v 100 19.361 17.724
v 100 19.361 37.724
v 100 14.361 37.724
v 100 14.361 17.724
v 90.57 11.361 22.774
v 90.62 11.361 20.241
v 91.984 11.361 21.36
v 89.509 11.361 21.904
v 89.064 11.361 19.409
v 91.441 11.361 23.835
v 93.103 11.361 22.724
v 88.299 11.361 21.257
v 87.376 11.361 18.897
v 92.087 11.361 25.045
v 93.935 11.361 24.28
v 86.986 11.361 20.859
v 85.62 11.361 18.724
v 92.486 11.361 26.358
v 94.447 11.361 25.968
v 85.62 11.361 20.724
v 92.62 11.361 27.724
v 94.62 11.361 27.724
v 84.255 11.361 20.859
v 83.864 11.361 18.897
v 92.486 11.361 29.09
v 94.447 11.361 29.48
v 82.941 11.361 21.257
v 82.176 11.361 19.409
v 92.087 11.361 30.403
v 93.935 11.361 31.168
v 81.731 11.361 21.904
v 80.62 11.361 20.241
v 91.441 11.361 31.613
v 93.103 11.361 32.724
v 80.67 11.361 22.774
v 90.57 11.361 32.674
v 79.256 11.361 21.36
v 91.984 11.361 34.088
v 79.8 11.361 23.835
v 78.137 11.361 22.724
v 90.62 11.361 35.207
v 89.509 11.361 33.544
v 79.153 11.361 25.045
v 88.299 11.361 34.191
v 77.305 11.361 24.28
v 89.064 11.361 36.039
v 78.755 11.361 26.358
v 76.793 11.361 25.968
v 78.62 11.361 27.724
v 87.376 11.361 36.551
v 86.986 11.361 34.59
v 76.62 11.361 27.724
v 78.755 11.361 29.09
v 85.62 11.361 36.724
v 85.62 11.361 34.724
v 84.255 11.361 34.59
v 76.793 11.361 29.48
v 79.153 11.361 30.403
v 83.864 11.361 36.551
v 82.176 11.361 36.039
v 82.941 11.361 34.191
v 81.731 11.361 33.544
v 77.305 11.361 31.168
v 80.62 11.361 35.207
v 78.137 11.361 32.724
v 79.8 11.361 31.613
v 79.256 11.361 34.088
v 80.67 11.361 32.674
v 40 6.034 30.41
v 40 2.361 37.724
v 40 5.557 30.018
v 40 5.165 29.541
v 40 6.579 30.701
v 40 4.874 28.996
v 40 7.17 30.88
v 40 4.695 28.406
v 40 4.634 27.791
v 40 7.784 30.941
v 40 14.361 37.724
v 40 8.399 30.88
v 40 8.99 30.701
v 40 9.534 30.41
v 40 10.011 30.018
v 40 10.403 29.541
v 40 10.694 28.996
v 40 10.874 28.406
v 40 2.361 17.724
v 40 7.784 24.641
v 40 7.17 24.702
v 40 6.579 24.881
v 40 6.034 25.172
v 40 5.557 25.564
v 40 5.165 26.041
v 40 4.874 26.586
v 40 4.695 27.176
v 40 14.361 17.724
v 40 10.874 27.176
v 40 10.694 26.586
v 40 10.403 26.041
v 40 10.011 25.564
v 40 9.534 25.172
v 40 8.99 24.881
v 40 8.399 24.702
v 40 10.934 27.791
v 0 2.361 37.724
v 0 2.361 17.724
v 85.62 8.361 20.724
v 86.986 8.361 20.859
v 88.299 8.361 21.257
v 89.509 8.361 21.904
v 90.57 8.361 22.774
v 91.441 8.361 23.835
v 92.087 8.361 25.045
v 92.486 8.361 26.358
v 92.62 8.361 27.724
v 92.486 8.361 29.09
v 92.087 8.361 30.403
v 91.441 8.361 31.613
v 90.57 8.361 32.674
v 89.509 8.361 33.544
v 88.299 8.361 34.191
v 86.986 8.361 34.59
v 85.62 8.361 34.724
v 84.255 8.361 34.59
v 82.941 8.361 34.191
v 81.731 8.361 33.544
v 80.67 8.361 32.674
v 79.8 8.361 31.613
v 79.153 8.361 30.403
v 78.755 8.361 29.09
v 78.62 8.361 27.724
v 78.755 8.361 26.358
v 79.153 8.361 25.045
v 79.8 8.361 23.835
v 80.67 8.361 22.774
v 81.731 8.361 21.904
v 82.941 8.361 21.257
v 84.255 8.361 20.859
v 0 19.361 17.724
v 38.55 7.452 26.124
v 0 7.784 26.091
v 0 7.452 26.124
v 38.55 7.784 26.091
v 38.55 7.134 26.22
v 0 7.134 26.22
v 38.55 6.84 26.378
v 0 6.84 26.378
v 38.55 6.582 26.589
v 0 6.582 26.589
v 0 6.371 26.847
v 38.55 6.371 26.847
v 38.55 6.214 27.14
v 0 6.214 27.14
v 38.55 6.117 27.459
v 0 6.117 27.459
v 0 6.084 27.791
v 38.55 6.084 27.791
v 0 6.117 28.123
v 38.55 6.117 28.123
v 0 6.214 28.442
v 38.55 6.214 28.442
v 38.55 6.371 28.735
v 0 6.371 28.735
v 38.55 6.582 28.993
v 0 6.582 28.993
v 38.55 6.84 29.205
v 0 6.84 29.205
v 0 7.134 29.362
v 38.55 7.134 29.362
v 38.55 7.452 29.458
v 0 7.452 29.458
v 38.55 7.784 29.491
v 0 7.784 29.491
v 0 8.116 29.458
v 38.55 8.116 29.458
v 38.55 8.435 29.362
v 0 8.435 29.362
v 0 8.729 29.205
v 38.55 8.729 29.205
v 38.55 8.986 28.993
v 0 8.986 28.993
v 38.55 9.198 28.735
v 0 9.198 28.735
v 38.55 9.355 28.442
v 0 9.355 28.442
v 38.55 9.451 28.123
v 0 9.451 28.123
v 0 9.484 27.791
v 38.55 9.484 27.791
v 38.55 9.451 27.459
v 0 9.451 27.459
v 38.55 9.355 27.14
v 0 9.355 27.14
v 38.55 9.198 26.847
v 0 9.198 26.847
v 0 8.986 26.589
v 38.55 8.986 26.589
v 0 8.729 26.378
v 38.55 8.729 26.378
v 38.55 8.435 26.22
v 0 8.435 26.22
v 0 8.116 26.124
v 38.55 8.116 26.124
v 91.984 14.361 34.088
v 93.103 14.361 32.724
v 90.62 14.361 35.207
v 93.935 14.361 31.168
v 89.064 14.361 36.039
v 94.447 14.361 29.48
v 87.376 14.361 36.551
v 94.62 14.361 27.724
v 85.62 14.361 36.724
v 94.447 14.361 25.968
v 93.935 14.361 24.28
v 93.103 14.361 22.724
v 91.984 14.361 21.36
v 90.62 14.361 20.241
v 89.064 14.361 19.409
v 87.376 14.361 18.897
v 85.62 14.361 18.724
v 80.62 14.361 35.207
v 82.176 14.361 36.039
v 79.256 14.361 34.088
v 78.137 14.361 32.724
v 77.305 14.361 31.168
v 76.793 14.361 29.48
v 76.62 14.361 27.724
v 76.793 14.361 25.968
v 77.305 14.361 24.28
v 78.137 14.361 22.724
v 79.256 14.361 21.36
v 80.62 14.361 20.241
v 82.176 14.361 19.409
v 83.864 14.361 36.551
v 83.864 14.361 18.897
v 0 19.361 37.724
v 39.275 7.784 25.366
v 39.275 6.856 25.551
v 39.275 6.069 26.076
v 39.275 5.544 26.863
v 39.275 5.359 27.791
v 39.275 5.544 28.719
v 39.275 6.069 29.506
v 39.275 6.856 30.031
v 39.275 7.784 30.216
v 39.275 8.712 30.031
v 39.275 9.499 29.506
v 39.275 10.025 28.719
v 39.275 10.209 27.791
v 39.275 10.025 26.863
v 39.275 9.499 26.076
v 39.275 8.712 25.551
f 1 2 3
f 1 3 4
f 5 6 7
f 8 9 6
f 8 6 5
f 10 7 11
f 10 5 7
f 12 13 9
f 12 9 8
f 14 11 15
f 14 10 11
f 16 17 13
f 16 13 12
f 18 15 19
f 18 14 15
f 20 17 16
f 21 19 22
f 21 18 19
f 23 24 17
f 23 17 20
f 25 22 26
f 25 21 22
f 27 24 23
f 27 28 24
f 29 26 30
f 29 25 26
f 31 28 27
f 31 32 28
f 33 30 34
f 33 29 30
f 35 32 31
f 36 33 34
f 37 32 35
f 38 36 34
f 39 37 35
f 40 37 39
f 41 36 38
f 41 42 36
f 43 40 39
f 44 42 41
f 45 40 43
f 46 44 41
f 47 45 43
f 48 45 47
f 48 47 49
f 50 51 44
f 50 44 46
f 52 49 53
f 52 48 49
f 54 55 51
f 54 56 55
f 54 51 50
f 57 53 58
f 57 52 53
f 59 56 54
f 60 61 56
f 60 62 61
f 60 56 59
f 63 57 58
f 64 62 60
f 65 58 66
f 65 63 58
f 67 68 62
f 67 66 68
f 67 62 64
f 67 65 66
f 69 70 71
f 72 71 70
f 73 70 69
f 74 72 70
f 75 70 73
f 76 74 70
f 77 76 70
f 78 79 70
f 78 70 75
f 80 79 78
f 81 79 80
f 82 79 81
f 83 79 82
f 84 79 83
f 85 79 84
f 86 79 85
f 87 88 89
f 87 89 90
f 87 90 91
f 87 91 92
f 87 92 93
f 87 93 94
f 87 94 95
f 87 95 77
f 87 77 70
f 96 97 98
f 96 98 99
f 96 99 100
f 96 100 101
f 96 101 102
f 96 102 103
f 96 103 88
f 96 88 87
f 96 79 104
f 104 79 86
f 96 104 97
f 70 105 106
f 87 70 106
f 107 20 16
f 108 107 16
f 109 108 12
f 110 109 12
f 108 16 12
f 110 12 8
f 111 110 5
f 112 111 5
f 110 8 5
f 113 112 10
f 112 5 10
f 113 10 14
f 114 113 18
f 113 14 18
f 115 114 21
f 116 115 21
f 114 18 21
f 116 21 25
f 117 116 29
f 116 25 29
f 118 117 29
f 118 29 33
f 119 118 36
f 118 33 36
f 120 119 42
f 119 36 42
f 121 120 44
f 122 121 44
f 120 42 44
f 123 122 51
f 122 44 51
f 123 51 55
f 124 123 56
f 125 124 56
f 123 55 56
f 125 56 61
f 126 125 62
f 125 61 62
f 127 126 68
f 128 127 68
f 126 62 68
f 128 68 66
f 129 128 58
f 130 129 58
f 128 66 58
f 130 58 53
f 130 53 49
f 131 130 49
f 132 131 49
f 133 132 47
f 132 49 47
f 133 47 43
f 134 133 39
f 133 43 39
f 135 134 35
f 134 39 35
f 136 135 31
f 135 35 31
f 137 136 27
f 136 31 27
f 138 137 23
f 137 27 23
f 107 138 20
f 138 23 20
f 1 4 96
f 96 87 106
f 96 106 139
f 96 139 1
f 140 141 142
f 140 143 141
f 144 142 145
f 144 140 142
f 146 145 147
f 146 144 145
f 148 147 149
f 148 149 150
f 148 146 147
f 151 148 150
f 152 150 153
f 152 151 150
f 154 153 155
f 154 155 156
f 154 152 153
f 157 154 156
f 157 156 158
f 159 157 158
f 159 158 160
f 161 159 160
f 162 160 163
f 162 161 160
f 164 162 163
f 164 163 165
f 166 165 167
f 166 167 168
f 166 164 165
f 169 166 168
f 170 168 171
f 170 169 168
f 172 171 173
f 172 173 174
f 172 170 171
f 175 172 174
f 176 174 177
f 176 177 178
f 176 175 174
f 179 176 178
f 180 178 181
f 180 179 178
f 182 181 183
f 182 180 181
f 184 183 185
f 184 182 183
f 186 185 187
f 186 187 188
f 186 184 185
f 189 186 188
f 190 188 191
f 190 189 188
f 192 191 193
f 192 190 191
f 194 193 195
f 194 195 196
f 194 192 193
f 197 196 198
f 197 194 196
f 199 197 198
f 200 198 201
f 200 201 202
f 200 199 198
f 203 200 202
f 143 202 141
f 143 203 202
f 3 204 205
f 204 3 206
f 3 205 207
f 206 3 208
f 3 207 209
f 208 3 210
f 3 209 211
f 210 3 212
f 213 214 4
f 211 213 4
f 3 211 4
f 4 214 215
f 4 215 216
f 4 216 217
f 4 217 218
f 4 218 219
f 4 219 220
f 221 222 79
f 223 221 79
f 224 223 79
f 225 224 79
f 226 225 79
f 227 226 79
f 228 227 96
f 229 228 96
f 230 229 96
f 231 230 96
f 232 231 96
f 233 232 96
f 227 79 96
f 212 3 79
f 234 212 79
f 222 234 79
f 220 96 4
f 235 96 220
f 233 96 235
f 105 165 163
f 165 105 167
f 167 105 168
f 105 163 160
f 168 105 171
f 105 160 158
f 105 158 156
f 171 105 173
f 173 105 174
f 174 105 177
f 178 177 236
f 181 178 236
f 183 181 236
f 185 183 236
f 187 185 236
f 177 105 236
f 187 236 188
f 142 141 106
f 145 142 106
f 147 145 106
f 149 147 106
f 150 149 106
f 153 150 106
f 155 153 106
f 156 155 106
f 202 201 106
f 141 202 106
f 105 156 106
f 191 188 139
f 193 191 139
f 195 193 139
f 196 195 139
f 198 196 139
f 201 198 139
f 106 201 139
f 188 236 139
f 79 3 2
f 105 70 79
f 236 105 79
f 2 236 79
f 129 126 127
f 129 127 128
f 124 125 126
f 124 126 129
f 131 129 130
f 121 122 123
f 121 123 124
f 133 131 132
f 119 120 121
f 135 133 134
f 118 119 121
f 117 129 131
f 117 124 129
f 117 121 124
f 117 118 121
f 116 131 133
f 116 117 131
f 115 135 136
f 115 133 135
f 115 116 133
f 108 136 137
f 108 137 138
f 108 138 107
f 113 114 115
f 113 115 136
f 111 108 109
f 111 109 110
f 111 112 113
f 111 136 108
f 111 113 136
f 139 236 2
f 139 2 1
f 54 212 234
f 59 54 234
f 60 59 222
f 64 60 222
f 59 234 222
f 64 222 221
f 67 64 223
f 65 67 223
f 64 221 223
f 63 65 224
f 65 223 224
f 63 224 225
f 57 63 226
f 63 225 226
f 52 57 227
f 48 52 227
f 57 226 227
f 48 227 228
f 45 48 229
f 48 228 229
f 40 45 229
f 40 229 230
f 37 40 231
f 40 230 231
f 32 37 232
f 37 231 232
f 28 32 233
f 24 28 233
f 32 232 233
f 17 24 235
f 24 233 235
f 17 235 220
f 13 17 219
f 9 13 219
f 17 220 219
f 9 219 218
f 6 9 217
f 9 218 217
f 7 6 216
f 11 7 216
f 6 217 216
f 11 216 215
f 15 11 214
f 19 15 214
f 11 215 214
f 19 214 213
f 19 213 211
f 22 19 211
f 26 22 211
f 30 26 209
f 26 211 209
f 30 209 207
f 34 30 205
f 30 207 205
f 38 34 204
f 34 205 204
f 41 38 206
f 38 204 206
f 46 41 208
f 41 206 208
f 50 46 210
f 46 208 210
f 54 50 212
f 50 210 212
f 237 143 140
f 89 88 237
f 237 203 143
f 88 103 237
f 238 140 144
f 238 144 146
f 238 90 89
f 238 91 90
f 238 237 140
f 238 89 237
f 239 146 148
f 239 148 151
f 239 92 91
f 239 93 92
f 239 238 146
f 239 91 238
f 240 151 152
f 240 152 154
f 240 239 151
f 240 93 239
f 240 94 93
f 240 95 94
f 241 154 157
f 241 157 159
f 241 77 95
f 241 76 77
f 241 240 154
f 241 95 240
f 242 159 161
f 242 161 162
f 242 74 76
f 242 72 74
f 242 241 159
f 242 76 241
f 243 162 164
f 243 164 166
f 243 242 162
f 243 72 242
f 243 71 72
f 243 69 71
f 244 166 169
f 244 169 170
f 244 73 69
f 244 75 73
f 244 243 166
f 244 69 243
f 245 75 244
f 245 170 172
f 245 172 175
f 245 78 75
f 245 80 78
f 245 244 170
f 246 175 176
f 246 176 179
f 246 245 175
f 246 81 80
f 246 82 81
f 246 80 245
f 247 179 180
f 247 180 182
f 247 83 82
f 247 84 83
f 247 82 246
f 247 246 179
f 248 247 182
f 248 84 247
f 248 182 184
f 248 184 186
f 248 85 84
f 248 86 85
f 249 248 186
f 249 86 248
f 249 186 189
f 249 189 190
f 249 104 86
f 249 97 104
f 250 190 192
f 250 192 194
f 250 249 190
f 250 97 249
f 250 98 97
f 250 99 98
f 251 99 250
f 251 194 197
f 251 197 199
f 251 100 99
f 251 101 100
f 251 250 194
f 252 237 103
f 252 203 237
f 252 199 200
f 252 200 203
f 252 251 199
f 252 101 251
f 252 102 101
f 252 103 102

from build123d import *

# Parameters (mm, degrees)
SKETCH_1_W      = 20
SKETCH_1_H      = 17
EXTRUDE_1_DEPTH = 40
SKETCH_2_W      = 20
SKETCH_2_H      = 5
EXTRUDE_2_DEPTH = 60
SKETCH_3_R      = 9
EXTRUDE_3_DEPTH = 3
SKETCH_4_R      = 7
EXTRUDE_4_DEPTH = 3


with BuildPart() as part:
    # Эскиз1 → Бобышка-Вытянуть1 (new body)
    with BuildSketch(Plane(origin=(0, 0, 0), x_dir=(0, 0, -1), z_dir=(1, 0, 0))):
        with Locations((-27.72412662, 10.860988518)):
            Rectangle(SKETCH_1_W, SKETCH_1_H)
    extrude(amount=EXTRUDE_1_DEPTH)

    # Эскиз2 → Бобышка-Вытянуть2 (add)
    with BuildSketch(Plane(origin=(40, 0, 0), x_dir=(0, 0, -1), z_dir=(1, 0, 0))):
        with Locations((-27.72412662, 16.860988518)):
            Rectangle(SKETCH_2_W, SKETCH_2_H)
    extrude(amount=EXTRUDE_2_DEPTH)

    # Эскиз3 → Бобышка-Вытянуть3 (add)
    with BuildSketch(Plane.XZ.offset(-14.360988518)):
        with Locations(Location((85.620234383, 27.72412662, 0), (0, 0, 90))):
            Circle(SKETCH_3_R)
    extrude(amount=EXTRUDE_3_DEPTH)

    # Эскиз4 → Бобышка-Вытянуть4 (add)
    with BuildSketch(Plane.XZ.offset(-11.360988518)):
        with Locations(Location((85.620234383, 27.72412662, 0), (0, 0, 270))):
            Circle(SKETCH_4_R)
    extrude(amount=EXTRUDE_4_DEPTH)

    # Эскиз15 → Зенковка для винта с полупотайной головкой M32 (revolve, cut)
    with BuildSketch(Plane(origin=(40, 7.784111953, 27.791024889), x_dir=(0, 0, -1), z_dir=(0, 1, 0))):
        Polygon((0, 0), (0, 40), (1.7, 40), (1.7, 1.45), (3.15, 0), align=None)
    revolve(axis=Axis((46.35, 7.784111953, 27.791024889), (-1, 0, 0)), mode=Mode.SUBTRACT)


solid = part.part
